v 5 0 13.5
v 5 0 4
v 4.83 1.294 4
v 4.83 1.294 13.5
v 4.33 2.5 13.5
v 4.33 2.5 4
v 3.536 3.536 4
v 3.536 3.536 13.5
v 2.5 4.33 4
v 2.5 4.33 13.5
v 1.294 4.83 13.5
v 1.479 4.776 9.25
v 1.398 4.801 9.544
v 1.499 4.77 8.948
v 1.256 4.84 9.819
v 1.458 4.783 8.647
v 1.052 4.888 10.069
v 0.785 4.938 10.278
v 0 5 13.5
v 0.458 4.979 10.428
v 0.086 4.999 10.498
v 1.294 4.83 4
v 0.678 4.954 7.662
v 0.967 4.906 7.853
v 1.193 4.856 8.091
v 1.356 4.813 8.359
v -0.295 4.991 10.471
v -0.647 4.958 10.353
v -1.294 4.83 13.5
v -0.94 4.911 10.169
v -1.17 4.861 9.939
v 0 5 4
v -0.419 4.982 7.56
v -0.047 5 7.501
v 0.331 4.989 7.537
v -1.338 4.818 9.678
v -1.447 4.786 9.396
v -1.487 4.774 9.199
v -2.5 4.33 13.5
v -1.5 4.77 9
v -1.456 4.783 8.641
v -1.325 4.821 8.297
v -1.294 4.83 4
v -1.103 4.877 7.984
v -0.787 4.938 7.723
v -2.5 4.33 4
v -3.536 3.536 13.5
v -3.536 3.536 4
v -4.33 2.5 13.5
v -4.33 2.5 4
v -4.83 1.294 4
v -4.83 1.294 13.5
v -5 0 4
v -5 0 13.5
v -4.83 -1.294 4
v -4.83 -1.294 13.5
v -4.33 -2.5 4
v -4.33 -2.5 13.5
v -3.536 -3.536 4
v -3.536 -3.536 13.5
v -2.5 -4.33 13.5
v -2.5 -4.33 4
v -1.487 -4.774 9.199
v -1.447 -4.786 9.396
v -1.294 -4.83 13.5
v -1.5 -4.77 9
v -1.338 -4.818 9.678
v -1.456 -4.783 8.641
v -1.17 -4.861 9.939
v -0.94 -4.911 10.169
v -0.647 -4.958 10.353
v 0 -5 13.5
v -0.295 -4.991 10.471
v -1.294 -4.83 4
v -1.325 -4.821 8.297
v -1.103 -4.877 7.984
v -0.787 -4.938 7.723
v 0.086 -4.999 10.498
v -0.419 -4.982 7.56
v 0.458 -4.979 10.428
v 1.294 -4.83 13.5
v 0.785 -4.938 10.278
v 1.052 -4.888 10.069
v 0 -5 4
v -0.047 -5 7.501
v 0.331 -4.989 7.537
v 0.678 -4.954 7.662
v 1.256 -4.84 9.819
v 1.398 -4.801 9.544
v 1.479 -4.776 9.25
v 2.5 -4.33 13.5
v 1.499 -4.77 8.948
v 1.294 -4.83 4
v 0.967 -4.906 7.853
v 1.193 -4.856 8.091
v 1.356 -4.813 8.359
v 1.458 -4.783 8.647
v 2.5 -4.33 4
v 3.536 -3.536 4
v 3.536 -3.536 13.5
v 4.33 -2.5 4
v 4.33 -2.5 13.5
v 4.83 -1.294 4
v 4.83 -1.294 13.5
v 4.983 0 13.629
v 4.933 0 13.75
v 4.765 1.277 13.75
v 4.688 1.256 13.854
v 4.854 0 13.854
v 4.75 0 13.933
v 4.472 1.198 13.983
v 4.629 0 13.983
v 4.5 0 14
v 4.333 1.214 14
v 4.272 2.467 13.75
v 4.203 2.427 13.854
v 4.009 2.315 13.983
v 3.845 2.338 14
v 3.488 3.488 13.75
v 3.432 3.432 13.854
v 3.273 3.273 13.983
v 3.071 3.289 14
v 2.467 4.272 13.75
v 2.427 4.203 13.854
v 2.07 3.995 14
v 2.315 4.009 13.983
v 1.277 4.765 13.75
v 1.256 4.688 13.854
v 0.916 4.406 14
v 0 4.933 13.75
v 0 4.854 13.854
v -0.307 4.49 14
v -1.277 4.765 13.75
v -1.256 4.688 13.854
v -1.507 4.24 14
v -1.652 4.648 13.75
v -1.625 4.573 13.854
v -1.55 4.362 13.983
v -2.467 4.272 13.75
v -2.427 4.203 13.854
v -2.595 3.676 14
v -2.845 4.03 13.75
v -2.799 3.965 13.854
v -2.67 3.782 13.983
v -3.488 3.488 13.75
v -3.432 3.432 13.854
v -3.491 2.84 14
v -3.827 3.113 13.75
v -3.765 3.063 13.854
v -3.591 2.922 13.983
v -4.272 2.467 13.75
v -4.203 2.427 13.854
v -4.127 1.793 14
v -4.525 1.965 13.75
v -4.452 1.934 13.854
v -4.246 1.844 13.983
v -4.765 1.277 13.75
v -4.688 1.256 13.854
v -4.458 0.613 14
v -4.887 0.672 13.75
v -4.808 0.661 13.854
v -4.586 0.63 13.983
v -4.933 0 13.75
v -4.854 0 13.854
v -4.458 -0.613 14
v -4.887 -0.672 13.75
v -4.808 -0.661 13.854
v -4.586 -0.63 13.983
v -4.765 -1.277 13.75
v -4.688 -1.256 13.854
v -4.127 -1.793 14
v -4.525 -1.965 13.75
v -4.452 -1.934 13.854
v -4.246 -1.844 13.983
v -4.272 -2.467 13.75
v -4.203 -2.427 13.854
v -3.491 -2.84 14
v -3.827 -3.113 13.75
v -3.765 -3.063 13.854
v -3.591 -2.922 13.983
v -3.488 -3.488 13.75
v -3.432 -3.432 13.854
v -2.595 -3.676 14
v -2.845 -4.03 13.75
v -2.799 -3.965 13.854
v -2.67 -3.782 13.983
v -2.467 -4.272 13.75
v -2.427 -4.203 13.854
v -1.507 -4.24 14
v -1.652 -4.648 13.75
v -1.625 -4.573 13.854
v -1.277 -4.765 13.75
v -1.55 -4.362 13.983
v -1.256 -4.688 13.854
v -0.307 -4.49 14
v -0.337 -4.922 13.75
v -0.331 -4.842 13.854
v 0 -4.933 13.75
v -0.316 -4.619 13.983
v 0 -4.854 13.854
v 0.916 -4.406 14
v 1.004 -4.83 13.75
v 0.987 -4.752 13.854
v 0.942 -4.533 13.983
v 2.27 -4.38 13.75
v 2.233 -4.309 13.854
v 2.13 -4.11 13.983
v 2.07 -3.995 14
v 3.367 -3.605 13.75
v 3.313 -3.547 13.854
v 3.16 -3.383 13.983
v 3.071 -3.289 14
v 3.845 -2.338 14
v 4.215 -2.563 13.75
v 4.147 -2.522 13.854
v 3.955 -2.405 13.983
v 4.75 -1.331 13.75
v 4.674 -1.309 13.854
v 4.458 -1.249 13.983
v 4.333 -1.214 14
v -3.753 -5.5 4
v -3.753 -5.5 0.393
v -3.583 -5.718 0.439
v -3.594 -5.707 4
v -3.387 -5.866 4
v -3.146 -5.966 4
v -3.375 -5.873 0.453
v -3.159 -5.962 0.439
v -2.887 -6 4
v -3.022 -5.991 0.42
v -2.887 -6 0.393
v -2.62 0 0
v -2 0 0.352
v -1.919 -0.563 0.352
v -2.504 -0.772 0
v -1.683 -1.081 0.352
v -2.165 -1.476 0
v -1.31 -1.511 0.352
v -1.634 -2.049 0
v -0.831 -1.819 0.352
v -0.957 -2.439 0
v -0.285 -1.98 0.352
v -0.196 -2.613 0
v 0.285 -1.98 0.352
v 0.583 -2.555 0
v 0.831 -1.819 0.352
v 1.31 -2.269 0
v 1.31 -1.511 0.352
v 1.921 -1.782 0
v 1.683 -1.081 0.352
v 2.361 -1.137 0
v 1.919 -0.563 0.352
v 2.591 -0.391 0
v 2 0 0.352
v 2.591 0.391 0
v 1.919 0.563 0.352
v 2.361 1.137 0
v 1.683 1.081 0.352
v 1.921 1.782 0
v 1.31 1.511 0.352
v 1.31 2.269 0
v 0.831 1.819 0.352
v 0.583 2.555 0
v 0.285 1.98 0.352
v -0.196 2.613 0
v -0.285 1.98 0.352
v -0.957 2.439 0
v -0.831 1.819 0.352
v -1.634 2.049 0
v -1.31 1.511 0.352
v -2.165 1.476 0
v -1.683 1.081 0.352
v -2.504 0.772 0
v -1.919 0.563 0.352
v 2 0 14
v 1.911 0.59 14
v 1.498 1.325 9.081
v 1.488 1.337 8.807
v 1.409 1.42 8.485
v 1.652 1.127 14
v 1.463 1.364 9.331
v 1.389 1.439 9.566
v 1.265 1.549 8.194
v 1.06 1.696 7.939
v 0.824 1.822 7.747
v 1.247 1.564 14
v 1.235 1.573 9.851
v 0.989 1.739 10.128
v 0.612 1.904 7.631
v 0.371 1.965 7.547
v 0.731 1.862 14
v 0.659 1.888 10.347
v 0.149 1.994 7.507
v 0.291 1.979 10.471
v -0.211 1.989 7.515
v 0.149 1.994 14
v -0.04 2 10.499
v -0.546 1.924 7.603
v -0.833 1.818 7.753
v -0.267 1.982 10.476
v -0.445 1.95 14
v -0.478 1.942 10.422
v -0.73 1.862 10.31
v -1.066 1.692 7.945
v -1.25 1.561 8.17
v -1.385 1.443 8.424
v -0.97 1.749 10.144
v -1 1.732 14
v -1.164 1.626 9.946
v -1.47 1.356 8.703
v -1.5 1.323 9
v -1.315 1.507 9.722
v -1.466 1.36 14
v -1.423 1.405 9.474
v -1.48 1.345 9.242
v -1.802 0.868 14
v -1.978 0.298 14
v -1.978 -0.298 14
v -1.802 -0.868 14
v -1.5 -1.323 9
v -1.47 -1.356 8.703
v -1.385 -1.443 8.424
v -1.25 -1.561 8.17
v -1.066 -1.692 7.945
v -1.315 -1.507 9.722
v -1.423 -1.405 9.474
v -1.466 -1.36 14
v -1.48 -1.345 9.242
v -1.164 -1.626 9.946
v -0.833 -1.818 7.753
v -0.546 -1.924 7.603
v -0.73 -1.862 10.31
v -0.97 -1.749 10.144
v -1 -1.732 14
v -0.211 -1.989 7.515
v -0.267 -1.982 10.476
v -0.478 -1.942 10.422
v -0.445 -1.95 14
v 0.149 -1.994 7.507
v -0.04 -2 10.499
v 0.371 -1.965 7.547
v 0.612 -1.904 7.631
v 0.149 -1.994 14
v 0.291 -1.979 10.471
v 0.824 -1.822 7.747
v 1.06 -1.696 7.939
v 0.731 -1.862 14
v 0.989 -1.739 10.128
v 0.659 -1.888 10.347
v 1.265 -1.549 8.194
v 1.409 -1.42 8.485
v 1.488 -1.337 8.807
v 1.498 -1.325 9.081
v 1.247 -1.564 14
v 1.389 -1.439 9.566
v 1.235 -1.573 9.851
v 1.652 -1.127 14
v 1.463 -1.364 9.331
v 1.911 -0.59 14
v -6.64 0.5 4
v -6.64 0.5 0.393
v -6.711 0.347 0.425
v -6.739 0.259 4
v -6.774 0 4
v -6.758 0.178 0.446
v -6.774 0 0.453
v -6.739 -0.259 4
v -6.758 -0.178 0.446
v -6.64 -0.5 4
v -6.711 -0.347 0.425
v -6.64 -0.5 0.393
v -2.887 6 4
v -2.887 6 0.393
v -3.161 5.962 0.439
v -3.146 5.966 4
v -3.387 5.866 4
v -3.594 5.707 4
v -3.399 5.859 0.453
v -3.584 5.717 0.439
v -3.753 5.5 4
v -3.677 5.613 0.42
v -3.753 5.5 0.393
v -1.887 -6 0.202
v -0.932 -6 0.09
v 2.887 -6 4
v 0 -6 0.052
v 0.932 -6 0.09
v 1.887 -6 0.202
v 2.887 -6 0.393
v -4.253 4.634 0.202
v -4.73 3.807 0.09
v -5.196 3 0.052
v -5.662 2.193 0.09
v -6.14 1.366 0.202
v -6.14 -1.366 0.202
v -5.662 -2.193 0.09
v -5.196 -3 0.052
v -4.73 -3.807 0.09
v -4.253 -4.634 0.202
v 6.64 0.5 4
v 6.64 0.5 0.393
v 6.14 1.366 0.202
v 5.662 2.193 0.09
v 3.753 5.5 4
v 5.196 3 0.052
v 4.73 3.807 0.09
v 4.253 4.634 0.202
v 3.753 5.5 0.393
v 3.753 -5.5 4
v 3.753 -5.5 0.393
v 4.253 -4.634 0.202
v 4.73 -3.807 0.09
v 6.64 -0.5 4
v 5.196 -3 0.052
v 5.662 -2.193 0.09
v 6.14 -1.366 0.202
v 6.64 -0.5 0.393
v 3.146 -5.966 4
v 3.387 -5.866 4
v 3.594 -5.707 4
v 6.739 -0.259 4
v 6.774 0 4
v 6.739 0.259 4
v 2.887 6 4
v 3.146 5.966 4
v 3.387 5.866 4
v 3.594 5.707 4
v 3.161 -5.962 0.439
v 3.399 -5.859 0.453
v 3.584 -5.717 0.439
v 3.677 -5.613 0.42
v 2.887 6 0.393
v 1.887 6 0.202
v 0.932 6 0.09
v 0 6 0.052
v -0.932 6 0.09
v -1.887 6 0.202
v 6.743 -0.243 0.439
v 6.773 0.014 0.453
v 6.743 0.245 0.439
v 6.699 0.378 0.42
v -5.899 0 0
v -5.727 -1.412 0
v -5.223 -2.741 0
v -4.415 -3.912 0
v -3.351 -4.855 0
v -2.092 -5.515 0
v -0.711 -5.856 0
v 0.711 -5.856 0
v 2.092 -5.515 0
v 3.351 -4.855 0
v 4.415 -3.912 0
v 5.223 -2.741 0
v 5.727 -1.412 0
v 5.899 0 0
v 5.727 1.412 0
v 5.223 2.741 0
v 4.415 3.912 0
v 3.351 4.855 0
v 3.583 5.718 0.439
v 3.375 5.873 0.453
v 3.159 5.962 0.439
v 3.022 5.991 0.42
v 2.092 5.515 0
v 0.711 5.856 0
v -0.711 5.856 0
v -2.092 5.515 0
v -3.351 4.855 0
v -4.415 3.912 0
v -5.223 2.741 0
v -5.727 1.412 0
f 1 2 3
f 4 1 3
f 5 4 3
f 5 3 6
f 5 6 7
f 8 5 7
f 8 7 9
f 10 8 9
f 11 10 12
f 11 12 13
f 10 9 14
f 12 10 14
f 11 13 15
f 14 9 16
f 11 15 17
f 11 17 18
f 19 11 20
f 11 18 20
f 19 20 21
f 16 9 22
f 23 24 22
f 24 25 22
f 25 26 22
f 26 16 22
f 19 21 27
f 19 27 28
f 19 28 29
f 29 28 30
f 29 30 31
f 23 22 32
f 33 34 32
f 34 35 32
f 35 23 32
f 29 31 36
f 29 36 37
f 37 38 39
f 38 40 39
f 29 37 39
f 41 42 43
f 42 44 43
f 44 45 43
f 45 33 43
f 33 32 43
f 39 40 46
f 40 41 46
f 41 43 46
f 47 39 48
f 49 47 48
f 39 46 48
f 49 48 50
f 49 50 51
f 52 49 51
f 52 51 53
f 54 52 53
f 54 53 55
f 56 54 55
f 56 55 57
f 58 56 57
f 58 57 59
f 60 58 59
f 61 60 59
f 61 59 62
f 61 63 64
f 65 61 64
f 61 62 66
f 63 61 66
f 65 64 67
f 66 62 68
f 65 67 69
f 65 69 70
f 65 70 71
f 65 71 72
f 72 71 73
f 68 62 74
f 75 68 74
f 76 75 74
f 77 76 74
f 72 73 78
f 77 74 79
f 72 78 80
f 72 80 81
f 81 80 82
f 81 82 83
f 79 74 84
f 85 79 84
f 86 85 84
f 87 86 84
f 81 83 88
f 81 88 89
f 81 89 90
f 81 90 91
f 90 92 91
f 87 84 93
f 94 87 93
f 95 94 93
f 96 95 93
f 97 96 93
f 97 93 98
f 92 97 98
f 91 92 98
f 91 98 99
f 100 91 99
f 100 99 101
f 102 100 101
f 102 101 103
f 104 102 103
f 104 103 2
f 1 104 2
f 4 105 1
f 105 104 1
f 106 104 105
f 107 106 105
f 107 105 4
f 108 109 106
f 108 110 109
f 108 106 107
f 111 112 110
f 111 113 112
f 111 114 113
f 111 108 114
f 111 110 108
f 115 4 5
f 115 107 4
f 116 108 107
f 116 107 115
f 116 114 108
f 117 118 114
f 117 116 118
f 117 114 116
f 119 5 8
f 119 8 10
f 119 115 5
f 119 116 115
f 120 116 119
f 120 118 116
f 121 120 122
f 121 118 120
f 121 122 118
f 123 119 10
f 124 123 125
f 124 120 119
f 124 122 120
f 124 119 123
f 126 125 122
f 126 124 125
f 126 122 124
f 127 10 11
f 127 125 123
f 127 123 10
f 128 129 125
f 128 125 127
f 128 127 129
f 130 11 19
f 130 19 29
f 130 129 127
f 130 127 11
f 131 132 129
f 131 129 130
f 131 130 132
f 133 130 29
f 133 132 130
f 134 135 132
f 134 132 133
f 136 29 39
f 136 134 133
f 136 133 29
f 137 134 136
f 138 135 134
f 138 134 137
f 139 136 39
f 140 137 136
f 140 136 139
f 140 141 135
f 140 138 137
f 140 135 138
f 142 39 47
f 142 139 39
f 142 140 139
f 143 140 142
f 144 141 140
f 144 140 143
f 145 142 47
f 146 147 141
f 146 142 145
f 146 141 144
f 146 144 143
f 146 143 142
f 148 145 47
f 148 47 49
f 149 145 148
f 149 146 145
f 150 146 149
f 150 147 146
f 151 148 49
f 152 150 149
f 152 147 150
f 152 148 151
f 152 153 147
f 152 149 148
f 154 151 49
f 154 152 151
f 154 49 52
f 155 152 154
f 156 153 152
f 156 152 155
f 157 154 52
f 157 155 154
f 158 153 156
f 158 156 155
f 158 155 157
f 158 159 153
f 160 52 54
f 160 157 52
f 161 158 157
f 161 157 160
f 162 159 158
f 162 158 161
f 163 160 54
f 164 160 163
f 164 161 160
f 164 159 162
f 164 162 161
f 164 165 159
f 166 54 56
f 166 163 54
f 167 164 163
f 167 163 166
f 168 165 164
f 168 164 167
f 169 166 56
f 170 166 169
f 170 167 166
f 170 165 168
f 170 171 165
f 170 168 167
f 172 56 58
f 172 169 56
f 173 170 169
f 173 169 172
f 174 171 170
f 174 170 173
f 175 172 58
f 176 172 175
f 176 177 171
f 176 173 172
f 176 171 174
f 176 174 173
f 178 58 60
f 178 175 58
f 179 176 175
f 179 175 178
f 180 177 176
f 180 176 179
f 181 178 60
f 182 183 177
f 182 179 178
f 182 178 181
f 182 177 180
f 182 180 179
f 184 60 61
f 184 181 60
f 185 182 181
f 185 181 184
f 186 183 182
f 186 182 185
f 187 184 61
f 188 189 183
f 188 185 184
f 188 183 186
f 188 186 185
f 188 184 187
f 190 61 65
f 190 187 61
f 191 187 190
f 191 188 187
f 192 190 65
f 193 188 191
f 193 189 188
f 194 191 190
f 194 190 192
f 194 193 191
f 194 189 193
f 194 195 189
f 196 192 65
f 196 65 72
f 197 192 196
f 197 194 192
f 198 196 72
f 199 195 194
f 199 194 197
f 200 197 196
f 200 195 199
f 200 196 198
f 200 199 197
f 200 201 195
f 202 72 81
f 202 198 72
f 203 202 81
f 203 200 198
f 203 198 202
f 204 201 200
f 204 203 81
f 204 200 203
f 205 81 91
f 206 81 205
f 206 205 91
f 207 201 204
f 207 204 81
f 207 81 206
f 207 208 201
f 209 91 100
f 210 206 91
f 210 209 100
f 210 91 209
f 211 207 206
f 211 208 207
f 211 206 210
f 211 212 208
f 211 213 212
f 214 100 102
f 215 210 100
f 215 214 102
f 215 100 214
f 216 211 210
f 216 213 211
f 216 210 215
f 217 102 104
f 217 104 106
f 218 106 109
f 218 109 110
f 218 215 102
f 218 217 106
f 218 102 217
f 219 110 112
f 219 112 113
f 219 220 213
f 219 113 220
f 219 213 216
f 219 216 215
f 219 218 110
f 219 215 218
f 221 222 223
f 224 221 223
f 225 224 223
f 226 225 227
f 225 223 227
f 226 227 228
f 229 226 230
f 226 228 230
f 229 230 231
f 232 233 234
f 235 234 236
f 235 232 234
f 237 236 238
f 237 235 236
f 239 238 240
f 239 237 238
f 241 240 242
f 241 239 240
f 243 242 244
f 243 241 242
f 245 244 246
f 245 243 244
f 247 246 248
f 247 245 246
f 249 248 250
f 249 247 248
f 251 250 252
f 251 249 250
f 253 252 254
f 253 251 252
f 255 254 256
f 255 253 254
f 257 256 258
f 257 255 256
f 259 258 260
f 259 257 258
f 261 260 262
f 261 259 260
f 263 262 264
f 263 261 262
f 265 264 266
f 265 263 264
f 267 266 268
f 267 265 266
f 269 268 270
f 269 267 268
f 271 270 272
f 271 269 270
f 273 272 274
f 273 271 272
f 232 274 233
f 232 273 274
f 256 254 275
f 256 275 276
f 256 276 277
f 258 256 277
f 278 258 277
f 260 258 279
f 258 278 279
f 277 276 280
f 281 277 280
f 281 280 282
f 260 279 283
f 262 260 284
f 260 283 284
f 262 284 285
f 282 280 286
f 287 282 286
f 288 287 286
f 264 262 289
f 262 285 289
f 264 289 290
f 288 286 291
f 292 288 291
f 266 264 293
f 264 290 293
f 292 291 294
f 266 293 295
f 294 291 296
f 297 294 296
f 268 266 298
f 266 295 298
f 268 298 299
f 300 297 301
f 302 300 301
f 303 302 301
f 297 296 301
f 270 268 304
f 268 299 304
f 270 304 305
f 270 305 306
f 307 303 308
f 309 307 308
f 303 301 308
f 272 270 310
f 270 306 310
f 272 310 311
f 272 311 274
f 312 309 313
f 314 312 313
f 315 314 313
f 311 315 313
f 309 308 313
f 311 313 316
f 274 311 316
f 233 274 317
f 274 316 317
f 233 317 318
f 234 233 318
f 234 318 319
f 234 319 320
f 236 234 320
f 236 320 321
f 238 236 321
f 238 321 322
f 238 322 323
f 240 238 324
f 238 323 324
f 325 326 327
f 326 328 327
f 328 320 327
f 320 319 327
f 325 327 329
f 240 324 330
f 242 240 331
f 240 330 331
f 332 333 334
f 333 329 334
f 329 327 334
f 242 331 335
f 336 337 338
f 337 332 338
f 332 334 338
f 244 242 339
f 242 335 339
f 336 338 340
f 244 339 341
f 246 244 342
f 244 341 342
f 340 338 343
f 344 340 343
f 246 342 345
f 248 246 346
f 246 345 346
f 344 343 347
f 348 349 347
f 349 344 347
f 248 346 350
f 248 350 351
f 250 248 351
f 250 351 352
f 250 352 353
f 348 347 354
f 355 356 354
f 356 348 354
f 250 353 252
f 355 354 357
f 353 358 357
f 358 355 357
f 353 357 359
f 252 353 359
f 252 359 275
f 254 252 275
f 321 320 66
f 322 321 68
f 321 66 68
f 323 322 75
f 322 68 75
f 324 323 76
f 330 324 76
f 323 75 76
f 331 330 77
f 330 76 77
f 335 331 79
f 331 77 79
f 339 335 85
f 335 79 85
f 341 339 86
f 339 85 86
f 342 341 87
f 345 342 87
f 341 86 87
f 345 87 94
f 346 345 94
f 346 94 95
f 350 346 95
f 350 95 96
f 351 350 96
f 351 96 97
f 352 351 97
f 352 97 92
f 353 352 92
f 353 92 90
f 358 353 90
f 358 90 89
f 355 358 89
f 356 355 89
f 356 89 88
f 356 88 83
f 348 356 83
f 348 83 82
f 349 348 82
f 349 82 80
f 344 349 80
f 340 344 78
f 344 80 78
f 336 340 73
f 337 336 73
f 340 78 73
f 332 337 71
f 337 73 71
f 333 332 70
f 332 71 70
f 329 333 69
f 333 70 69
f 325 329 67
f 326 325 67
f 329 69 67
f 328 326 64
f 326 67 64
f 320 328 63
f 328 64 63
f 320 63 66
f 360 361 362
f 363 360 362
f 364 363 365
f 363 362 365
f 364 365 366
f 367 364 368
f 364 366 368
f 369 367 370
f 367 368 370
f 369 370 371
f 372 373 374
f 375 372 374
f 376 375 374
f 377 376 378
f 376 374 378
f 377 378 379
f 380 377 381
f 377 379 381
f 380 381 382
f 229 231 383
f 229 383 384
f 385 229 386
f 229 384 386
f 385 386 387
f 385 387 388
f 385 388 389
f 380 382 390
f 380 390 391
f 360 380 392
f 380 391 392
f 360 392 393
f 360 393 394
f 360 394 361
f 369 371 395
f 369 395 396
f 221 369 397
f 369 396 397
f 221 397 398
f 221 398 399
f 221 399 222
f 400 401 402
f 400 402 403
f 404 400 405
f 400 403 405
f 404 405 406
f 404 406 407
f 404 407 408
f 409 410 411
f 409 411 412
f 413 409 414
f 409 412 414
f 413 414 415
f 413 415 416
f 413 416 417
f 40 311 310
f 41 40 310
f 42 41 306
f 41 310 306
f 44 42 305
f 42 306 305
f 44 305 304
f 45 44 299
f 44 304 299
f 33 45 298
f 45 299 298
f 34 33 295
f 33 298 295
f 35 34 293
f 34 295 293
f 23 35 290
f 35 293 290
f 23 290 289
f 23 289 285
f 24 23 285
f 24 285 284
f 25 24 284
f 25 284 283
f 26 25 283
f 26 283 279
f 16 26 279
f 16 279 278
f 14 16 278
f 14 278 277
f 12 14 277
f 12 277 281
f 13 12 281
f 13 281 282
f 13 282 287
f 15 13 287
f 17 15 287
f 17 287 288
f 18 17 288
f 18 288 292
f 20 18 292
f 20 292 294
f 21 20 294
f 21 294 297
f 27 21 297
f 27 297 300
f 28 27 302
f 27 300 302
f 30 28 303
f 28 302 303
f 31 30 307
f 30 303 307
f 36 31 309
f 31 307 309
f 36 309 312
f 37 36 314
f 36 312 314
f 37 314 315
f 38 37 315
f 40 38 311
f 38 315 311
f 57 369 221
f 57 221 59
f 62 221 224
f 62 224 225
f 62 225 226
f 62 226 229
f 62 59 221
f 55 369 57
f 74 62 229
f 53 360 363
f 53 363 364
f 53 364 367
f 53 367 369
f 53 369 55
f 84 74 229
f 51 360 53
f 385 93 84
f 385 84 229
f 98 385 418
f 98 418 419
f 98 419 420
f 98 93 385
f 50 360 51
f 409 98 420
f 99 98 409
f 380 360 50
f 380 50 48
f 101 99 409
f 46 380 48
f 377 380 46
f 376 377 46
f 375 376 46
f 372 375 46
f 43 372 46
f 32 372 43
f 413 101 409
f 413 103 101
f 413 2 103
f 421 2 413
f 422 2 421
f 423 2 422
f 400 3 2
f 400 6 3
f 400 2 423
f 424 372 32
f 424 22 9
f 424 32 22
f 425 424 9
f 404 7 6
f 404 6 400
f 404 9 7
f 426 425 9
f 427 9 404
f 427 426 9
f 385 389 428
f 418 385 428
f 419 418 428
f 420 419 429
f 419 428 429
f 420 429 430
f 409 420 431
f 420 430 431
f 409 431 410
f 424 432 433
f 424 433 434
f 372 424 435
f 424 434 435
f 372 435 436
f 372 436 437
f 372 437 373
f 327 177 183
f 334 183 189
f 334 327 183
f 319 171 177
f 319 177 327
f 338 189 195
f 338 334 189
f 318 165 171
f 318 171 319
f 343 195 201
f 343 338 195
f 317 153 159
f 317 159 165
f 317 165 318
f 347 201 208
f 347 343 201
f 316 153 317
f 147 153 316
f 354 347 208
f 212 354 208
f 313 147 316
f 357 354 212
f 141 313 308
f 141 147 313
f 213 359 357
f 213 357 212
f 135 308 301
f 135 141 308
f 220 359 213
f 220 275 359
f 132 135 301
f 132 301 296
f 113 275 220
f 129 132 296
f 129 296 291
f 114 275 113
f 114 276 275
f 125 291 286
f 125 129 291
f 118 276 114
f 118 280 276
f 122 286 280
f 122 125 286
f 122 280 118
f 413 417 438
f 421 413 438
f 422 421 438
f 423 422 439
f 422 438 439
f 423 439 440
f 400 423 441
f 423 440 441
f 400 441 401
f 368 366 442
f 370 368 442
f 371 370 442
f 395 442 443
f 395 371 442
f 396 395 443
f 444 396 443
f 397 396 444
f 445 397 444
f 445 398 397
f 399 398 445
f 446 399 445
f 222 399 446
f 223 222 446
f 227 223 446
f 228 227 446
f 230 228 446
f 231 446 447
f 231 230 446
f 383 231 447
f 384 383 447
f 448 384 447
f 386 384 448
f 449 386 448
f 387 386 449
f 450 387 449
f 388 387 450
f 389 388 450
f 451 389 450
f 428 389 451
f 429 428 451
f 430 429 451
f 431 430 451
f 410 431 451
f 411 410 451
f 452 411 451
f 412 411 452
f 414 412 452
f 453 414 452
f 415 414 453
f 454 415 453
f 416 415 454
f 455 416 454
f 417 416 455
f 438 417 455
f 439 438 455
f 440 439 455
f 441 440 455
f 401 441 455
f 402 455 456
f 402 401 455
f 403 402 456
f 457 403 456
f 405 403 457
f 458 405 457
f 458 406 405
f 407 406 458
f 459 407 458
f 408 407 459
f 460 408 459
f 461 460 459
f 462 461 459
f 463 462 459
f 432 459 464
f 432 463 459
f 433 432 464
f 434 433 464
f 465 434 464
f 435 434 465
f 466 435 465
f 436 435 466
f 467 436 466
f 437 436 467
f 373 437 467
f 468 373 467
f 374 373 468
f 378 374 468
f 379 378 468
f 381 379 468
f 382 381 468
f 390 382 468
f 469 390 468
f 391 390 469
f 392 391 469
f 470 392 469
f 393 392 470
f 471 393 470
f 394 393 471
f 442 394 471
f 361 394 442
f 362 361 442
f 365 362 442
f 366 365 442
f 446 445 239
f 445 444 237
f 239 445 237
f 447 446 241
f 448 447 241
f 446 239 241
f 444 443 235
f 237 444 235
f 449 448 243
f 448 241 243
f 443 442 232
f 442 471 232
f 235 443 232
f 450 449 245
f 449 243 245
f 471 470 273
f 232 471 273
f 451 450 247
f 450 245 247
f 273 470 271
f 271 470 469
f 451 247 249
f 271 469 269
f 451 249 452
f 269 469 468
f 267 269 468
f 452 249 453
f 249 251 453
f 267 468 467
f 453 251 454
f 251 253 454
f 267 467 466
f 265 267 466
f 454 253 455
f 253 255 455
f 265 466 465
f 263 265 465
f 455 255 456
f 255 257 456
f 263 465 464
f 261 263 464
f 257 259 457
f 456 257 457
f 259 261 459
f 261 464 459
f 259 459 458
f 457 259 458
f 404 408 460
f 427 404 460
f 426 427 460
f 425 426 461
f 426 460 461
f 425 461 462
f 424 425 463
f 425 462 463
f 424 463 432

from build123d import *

# Parameters (mm, degrees)
BOSS_EXTRUDE1_DEPTH   = 4
SKETCH2_R             = 5
BOSS_EXTRUDE2_DEPTH   = 10
SKETCH3_R             = 2
CUT_EXTRUDE1_DEPTH    = 15
F_3_0MM_DOWEL_SLOT5_D = 3
FILLET1_R             = 0.5


with BuildPart() as part:
    # Sketch1 → Boss-Extrude1 (new body)
    with BuildSketch(Plane.XY):
        with BuildLine():
            Line((-2.886751346, -6), (2.886751346, -6))
            ThreePointArc((2.886751346, -6), (3.386751346, -5.866025404), (3.75277675, -5.5))
            Line((3.75277675, -5.5), (6.639528096, -0.5))
            ThreePointArc((6.639528096, -0.5), (6.773502692, 0), (6.639528096, 0.5))
            Line((6.639528096, 0.5), (3.75277675, 5.5))
            ThreePointArc((3.75277675, 5.5), (3.386751346, 5.866025404), (2.886751346, 6))
            Line((2.886751346, 6), (-2.886751346, 6))
            ThreePointArc((-2.886751346, 6), (-3.386751346, 5.866025404), (-3.75277675, 5.5))
            Line((-3.75277675, 5.5), (-6.639528096, 0.5))
            ThreePointArc((-6.639528096, 0.5), (-6.773502692, 0), (-6.639528096, -0.5))
            Line((-6.639528096, -0.5), (-3.75277675, -5.5))
            ThreePointArc((-3.75277675, -5.5), (-3.386751346, -5.866025404), (-2.886751346, -6))
        make_face()
    extrude(amount=BOSS_EXTRUDE1_DEPTH)

    # Sketch2 → Boss-Extrude2 (add)
    with BuildSketch(Plane.XY.offset(4)):
        Circle(SKETCH2_R)
    extrude(amount=BOSS_EXTRUDE2_DEPTH)

    # Sketch3 → Cut-Extrude1 (cut, through all)
    with BuildSketch(Plane.XY.offset(14)):
        Circle(SKETCH3_R)
    extrude(amount=-CUT_EXTRUDE1_DEPTH, mode=Mode.SUBTRACT)

    # Ø3.0mm Dowel Slot5 (through all)
    with Locations(Plane(origin=(0, 6, 0), x_dir=(1, 0, 0), z_dir=(0, 1, 0))):
        with Locations((0, -9)):
            Hole(F_3_0MM_DOWEL_SLOT5_D / 2)

    # Fillet1
    fillet1_edges = [part.edges().sort_by_distance(p)[0] for p in [
        (-5, 0, 14),
    ]]
    fillet(fillet1_edges, radius=FILLET1_R)

    # Sketch12 → Cut-Revolve1 (revolve, cut)
    with BuildSketch(Plane(origin=(0, 0, 0), x_dir=(1, 0, 0), z_dir=(0, 1, 0))):
        Polygon((0, 0), (0, -0.526706506), (-1.691943312, -0.526706506), (-3.449696503, 0.470605478), (-4.989422791, 0.470605478), (-6.968108857, -0.553510453), (-7.302945228, -0.553510453), (-7.302945228, 1.336347729), (0, 1.336347729), align=None)
    revolve(axis=Axis((0, 0, -3.230240026), (0, 0, 1)), mode=Mode.SUBTRACT)


solid = part.part
